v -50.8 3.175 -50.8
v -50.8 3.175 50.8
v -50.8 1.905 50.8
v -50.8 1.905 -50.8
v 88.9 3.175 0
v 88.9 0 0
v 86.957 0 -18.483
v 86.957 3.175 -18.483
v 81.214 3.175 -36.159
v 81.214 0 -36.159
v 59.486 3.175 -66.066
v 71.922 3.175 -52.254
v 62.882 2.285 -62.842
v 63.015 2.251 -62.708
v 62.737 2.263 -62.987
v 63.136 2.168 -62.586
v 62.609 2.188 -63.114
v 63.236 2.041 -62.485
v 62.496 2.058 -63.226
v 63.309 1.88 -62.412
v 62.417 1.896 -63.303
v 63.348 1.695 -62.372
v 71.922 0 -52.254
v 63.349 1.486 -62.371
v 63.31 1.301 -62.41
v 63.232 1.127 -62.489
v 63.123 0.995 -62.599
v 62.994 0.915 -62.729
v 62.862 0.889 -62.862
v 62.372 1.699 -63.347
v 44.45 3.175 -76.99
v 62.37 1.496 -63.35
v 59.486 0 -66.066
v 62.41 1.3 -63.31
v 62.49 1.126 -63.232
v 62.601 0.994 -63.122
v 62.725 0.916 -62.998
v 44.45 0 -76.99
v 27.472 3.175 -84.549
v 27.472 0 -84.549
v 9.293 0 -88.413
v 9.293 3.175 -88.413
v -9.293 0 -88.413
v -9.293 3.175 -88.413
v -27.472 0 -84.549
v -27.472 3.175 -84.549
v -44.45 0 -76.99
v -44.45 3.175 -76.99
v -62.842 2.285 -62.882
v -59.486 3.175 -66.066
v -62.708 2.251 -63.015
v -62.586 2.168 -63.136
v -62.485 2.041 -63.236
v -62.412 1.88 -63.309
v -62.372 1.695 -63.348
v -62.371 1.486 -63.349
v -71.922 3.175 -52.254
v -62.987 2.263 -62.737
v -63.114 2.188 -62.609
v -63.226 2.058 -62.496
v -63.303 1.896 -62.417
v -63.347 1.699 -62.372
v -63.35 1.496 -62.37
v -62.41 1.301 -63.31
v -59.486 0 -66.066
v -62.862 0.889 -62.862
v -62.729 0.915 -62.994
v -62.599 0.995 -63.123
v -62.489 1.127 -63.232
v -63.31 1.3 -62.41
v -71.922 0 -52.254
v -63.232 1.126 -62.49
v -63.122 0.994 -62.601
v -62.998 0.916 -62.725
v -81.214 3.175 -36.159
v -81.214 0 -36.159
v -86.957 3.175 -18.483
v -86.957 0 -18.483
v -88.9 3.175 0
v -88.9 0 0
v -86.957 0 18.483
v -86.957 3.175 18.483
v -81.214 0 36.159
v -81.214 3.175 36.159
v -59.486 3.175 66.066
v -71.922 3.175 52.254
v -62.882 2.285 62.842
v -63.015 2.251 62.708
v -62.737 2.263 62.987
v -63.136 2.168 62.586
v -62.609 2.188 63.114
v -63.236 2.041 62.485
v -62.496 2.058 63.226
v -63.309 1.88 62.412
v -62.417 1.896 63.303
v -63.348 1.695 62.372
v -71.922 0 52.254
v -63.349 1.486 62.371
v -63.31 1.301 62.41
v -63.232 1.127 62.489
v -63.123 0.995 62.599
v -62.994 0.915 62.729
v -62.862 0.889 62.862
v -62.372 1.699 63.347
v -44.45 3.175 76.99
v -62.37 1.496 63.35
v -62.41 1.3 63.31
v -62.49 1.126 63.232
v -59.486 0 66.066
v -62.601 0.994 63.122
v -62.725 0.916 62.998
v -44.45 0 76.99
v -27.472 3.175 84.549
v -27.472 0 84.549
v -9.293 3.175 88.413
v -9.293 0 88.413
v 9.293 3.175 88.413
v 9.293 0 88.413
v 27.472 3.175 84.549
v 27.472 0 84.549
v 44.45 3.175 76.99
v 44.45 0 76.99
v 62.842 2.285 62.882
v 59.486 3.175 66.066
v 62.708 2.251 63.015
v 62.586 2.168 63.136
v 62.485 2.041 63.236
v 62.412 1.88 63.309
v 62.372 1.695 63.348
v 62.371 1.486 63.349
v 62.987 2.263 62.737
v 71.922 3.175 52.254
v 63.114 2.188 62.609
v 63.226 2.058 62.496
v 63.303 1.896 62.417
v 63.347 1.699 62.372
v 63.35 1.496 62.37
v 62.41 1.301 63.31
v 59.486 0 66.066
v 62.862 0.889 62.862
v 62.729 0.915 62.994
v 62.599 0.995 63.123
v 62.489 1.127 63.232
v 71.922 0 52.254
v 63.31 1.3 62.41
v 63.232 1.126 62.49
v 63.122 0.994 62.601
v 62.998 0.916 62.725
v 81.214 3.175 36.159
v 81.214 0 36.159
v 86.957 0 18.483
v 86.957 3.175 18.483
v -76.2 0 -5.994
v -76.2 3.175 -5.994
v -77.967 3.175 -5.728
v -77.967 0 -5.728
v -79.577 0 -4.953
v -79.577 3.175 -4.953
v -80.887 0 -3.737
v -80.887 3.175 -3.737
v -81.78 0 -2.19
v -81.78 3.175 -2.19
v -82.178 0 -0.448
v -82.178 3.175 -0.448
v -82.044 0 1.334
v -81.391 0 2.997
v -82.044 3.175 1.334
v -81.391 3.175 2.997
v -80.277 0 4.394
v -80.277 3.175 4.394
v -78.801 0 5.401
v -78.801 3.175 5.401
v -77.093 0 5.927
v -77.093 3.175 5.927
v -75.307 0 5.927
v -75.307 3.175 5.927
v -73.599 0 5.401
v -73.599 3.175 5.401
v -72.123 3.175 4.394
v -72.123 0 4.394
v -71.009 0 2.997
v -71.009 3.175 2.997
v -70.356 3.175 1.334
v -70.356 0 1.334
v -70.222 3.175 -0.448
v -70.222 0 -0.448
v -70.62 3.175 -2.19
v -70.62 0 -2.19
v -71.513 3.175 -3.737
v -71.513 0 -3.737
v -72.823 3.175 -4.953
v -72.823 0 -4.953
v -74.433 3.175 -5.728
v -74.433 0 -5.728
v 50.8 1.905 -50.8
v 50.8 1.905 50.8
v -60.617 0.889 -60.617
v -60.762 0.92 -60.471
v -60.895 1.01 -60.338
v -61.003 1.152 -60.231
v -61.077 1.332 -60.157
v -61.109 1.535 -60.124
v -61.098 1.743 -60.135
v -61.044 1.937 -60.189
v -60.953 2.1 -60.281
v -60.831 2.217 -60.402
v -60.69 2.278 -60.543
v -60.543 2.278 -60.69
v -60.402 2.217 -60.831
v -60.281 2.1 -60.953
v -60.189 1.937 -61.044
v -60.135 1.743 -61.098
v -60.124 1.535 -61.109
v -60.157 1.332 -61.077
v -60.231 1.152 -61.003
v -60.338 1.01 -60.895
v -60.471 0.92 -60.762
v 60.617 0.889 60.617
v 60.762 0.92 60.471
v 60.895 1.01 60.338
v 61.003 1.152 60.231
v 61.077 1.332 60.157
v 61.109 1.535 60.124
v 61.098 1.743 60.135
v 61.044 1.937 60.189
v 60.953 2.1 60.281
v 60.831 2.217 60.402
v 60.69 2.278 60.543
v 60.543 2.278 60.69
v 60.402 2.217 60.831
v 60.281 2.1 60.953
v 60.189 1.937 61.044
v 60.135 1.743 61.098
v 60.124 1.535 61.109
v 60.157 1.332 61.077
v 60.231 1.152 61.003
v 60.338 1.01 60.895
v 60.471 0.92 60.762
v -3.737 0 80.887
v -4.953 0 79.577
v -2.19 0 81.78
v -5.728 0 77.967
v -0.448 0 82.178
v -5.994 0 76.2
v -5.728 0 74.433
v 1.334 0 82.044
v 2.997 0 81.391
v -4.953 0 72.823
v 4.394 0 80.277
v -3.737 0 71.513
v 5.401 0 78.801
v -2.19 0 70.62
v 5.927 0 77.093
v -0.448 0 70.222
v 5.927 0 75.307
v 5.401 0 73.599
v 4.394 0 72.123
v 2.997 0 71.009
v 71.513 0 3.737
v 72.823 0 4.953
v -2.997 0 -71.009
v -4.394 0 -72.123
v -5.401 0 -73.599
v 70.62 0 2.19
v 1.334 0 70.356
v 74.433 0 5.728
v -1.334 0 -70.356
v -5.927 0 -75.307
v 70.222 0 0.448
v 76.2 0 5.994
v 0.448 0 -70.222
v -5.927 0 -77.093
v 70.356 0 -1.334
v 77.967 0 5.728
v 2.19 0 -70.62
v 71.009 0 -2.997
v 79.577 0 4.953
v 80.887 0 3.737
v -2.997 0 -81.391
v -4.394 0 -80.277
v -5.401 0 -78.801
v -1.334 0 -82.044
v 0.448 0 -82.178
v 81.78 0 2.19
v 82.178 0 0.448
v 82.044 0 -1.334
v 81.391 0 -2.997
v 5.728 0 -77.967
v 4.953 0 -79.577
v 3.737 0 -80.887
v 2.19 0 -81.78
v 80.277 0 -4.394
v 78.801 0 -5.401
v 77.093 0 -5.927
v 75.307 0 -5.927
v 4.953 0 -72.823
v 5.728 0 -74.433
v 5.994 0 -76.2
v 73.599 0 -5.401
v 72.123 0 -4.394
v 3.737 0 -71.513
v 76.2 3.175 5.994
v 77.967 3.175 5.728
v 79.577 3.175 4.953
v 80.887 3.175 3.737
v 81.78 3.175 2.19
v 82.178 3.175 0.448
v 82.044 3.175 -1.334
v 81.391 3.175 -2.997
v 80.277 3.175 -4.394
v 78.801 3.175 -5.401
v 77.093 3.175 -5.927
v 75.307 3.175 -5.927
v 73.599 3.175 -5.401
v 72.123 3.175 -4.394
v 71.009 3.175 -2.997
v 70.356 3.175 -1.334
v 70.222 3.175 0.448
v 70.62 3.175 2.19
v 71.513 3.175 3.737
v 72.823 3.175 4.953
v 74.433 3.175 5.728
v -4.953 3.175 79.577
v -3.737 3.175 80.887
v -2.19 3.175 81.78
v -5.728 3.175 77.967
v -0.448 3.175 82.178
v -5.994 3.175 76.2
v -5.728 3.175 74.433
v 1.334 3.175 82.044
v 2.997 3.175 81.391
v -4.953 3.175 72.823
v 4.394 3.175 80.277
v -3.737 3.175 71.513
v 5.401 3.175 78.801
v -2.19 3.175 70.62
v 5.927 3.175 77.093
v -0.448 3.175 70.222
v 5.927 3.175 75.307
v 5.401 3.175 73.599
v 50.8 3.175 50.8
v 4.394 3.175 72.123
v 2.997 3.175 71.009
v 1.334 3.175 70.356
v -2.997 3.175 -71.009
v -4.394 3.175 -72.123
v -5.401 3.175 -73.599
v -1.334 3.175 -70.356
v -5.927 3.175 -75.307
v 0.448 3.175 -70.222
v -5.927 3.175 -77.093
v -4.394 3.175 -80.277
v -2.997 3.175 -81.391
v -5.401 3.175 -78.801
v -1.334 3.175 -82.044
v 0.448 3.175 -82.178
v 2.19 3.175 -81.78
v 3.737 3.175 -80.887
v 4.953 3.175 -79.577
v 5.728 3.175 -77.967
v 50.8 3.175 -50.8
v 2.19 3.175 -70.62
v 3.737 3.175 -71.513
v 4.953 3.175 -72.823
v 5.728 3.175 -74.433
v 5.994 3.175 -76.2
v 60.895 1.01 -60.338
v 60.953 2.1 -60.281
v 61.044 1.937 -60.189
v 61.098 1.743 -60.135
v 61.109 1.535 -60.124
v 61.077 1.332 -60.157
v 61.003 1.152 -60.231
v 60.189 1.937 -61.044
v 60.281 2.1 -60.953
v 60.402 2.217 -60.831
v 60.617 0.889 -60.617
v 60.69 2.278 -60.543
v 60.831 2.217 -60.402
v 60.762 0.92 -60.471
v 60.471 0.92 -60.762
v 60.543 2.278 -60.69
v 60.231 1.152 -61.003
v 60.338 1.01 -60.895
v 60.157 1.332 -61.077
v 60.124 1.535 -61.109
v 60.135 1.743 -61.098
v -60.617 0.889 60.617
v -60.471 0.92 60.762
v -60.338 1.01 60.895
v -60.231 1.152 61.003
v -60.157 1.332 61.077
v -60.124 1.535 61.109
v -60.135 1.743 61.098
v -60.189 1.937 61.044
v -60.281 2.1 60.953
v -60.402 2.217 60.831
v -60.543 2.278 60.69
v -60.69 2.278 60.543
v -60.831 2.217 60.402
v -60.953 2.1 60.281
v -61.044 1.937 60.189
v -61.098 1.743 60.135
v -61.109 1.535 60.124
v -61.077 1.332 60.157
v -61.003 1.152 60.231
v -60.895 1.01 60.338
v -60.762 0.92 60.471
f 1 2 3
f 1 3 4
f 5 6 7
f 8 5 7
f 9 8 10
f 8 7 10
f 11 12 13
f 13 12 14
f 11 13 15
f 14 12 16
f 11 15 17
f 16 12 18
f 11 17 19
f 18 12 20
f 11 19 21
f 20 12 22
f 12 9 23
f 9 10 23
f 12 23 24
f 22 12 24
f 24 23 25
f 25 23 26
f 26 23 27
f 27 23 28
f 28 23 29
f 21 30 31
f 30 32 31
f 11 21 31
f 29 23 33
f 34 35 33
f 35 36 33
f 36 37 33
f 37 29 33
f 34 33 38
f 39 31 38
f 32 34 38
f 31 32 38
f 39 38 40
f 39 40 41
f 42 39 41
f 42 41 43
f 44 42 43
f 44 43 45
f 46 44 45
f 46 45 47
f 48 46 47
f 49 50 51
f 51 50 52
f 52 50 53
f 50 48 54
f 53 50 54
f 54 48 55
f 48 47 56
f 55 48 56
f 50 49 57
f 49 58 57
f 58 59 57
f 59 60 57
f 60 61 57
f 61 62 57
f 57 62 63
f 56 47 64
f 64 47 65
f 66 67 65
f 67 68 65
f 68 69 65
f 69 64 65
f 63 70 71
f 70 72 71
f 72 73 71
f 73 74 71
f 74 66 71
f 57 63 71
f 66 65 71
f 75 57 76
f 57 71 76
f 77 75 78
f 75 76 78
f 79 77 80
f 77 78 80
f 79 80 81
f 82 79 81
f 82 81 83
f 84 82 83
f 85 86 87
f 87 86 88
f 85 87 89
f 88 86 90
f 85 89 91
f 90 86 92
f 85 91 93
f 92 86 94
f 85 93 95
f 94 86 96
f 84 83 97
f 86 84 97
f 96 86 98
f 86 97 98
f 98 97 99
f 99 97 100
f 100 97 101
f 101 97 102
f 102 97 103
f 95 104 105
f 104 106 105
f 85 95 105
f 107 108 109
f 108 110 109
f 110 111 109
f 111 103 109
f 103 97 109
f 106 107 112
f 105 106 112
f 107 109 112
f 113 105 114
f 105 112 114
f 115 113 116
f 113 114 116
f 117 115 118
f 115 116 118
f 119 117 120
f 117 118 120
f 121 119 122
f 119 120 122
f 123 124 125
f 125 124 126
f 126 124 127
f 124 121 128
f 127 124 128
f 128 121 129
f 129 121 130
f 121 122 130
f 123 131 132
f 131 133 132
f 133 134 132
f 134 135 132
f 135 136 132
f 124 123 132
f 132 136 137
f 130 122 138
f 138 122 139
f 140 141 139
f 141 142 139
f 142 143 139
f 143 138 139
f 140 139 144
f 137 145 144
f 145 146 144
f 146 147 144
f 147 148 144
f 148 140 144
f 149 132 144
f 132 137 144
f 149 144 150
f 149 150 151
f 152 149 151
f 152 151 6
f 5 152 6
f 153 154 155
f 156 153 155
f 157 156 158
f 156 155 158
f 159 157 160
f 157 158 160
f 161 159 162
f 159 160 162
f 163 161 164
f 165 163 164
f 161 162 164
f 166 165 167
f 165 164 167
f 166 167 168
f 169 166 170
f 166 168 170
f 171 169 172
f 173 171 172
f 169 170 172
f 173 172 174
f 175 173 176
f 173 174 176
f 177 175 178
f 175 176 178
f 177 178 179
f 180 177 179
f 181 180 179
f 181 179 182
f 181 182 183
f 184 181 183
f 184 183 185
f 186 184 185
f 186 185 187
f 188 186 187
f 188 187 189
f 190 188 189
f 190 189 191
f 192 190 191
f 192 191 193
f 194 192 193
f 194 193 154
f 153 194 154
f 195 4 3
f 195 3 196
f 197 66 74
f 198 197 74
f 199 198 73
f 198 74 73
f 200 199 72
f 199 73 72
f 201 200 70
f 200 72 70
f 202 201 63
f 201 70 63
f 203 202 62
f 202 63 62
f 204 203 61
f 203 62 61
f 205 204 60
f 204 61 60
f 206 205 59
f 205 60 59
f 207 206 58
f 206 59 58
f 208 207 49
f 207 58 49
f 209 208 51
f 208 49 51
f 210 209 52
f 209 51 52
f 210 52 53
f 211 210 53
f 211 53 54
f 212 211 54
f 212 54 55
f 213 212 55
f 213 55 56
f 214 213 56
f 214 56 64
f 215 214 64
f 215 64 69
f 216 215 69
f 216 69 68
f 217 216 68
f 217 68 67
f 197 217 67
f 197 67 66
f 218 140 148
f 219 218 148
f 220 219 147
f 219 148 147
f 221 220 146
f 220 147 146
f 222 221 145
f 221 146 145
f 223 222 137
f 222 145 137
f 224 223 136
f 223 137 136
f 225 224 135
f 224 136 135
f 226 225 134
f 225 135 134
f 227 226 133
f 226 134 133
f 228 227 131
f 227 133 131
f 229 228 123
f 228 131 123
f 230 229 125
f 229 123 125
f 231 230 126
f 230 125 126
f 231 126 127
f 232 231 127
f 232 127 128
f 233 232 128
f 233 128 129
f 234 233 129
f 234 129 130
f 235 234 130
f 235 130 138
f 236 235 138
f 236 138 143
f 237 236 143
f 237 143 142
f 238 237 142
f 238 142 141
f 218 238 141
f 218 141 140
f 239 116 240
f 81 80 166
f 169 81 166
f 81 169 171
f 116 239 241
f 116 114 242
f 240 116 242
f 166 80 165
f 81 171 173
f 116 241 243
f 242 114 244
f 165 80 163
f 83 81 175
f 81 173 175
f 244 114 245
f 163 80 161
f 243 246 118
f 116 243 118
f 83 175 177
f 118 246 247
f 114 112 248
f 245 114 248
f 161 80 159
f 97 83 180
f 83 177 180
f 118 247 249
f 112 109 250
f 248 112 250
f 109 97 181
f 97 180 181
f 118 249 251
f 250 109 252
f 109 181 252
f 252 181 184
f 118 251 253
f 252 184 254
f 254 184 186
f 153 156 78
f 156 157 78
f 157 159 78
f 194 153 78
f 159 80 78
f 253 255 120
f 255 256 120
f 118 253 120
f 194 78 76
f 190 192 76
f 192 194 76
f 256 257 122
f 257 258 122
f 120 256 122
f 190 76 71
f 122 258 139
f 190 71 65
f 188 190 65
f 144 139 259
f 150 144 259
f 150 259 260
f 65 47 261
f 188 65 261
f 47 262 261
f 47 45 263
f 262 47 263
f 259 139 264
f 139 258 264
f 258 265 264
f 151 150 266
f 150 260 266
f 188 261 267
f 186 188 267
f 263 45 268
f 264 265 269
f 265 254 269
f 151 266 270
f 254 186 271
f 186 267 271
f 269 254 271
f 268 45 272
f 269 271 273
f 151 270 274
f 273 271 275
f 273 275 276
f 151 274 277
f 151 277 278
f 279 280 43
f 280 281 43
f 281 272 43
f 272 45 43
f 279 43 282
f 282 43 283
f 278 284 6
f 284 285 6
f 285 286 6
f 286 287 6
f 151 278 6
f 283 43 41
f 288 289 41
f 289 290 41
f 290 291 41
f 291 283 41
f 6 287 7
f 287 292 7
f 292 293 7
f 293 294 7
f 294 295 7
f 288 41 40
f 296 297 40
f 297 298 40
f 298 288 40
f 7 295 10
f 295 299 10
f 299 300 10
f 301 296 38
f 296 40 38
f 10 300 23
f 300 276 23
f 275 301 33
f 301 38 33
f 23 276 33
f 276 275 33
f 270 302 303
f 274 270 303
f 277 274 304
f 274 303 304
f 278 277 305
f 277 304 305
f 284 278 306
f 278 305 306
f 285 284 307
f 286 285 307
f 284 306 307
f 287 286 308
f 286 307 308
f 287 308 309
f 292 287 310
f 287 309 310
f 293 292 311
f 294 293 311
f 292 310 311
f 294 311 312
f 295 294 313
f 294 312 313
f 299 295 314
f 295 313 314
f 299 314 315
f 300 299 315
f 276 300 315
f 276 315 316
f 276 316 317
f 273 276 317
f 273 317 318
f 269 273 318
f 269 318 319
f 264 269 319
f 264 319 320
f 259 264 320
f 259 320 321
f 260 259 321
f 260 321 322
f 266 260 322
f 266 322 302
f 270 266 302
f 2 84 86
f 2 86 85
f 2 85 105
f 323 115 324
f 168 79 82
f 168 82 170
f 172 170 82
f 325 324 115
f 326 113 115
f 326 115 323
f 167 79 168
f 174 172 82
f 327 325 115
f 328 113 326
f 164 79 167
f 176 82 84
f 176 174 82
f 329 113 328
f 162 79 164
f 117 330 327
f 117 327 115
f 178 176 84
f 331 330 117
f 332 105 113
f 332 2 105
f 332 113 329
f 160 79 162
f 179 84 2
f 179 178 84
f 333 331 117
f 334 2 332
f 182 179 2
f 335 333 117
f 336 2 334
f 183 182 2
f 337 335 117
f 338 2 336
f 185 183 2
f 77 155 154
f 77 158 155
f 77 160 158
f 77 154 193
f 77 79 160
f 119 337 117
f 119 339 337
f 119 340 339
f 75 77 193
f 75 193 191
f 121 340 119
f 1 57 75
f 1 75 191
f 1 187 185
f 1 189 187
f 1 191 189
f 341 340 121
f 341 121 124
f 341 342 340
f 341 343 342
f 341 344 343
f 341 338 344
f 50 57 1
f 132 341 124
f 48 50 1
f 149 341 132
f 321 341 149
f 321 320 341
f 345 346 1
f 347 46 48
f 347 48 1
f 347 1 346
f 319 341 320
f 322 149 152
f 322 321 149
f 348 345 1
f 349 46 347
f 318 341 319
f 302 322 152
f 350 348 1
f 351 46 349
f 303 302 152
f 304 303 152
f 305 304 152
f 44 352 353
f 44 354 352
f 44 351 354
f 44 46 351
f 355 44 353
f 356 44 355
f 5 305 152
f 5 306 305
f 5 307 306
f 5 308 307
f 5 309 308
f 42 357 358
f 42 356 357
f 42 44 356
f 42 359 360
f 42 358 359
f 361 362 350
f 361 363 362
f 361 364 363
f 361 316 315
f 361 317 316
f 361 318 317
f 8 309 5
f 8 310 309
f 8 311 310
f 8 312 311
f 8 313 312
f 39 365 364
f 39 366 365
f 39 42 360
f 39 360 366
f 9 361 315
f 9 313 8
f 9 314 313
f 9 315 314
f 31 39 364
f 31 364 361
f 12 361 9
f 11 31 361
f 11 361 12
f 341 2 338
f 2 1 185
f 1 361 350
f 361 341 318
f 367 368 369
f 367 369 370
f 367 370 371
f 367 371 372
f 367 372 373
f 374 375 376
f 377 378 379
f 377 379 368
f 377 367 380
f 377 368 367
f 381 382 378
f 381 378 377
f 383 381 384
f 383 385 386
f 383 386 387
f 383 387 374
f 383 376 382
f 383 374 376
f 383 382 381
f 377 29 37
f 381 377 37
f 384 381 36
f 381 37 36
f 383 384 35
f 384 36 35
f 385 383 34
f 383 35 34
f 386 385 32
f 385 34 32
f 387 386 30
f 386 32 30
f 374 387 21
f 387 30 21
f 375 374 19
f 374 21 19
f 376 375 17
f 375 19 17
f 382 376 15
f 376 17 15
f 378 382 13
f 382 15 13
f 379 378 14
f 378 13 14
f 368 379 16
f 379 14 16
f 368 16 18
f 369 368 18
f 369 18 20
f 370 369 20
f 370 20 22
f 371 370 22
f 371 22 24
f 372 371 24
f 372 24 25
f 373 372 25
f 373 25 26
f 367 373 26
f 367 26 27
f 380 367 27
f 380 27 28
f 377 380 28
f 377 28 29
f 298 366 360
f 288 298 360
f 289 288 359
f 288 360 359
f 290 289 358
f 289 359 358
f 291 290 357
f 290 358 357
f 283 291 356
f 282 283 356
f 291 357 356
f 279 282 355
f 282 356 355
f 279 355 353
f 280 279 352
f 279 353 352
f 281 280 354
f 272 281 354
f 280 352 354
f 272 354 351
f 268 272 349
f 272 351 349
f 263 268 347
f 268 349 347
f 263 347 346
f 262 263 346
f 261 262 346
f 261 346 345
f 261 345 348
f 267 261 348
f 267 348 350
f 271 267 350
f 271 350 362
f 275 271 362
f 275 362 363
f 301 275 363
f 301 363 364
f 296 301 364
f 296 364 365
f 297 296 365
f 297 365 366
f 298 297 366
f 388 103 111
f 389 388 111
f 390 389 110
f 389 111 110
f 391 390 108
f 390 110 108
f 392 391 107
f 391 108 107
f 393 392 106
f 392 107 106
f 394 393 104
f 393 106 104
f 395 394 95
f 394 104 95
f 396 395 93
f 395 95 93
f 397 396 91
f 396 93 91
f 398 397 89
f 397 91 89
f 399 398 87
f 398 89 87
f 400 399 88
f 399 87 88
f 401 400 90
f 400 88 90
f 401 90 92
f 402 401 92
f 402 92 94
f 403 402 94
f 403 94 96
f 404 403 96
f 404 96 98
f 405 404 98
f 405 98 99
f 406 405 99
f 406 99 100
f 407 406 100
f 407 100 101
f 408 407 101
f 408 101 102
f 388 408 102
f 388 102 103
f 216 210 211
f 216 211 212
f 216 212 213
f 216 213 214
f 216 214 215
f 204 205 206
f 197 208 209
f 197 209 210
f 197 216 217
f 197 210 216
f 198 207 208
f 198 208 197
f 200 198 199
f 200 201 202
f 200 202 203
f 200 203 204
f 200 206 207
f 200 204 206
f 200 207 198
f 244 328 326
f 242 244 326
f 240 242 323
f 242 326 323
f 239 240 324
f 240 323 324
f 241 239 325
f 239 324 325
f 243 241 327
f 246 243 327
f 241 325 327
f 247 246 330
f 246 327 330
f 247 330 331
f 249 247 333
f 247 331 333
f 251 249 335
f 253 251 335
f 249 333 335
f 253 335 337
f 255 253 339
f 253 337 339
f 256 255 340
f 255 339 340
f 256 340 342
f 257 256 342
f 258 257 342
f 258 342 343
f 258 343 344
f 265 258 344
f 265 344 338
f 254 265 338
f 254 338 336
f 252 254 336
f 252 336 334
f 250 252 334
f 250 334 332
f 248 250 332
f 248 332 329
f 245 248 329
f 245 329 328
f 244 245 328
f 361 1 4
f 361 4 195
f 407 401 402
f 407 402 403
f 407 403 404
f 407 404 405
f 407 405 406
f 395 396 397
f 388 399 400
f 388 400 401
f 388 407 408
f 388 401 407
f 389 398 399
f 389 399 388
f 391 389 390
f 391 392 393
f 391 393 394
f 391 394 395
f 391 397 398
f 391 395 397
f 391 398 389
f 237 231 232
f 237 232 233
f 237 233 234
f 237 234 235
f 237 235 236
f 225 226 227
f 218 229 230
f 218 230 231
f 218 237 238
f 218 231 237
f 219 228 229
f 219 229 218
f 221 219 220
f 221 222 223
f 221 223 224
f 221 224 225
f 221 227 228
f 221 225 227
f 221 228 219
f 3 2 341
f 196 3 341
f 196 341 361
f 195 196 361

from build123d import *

# Parameters (mm, degrees)
SKETCH1_R           = 88.9
BOSS_EXTRUDE1_DEPTH = 3.175
SKETCH2_R           = 5.9944
CUT_EXTRUDE1_DEPTH  = 4.175
CIRPATTERN1_COUNT   = 4
SKETCH3_R           = 0.6985
CUT_EXTRUDE2_DEPTH  = 3.175
CIRPATTERN2_COUNT   = 4
SKETCH4_W           = 101.6
SKETCH4_H           = 101.6
CUT_EXTRUDE3_DEPTH  = 1.27


with BuildPart() as part:
    # Sketch1 → Boss-Extrude1 (new body)
    with BuildSketch(Plane(origin=(0, 0, 0), x_dir=(1, 0, 0), z_dir=(0, 1, 0))):
        Circle(SKETCH1_R)
    extrude(amount=BOSS_EXTRUDE1_DEPTH)

    # Sketch2 → Cut-Extrude1 (cut, through all)
    with BuildSketch(Plane(origin=(0, 3.175, 0), x_dir=(1, 0, 0), z_dir=(0, 1, 0))):
        with Locations((0, 76.2)):
            Circle(SKETCH2_R)
    cut_extrude1 = extrude(amount=-CUT_EXTRUDE1_DEPTH, mode=Mode.SUBTRACT)

    # CirPattern1: Cut-Extrude1 ×4 about axis
    cirpattern1_axis = Axis((0, 0, 0), (0, 1, 0))
    for i in range(1, CIRPATTERN1_COUNT):
        add(cut_extrude1.rotate(cirpattern1_axis, i * 360 / CIRPATTERN1_COUNT), mode=Mode.SUBTRACT)

    # Sketch3 → Cut-Extrude2 (cut)
    with BuildSketch(Plane(origin=(-62.861792847, 0, 62.861792847), x_dir=(0, -1, 0), z_dir=(-0.707106781, 0, 0.707106781))):
        with Locations((-1.5875, 0)):
            Circle(SKETCH3_R)
    cut_extrude2 = extrude(amount=-CUT_EXTRUDE2_DEPTH, mode=Mode.SUBTRACT)

    # CirPattern2: Cut-Extrude2 ×4 about axis
    cirpattern2_axis = Axis((0, 0, 0), (0, 1, 0))
    for i in range(1, CIRPATTERN2_COUNT):
        add(cut_extrude2.rotate(cirpattern2_axis, i * 360 / CIRPATTERN2_COUNT), mode=Mode.SUBTRACT)

    # Sketch4 → Cut-Extrude3 (cut)
    with BuildSketch(Plane(origin=(0, 3.175, 0), x_dir=(1, 0, 0), z_dir=(0, 1, 0))):
        Rectangle(SKETCH4_W, SKETCH4_H)
    extrude(amount=-CUT_EXTRUDE3_DEPTH, mode=Mode.SUBTRACT)


solid = part.part
